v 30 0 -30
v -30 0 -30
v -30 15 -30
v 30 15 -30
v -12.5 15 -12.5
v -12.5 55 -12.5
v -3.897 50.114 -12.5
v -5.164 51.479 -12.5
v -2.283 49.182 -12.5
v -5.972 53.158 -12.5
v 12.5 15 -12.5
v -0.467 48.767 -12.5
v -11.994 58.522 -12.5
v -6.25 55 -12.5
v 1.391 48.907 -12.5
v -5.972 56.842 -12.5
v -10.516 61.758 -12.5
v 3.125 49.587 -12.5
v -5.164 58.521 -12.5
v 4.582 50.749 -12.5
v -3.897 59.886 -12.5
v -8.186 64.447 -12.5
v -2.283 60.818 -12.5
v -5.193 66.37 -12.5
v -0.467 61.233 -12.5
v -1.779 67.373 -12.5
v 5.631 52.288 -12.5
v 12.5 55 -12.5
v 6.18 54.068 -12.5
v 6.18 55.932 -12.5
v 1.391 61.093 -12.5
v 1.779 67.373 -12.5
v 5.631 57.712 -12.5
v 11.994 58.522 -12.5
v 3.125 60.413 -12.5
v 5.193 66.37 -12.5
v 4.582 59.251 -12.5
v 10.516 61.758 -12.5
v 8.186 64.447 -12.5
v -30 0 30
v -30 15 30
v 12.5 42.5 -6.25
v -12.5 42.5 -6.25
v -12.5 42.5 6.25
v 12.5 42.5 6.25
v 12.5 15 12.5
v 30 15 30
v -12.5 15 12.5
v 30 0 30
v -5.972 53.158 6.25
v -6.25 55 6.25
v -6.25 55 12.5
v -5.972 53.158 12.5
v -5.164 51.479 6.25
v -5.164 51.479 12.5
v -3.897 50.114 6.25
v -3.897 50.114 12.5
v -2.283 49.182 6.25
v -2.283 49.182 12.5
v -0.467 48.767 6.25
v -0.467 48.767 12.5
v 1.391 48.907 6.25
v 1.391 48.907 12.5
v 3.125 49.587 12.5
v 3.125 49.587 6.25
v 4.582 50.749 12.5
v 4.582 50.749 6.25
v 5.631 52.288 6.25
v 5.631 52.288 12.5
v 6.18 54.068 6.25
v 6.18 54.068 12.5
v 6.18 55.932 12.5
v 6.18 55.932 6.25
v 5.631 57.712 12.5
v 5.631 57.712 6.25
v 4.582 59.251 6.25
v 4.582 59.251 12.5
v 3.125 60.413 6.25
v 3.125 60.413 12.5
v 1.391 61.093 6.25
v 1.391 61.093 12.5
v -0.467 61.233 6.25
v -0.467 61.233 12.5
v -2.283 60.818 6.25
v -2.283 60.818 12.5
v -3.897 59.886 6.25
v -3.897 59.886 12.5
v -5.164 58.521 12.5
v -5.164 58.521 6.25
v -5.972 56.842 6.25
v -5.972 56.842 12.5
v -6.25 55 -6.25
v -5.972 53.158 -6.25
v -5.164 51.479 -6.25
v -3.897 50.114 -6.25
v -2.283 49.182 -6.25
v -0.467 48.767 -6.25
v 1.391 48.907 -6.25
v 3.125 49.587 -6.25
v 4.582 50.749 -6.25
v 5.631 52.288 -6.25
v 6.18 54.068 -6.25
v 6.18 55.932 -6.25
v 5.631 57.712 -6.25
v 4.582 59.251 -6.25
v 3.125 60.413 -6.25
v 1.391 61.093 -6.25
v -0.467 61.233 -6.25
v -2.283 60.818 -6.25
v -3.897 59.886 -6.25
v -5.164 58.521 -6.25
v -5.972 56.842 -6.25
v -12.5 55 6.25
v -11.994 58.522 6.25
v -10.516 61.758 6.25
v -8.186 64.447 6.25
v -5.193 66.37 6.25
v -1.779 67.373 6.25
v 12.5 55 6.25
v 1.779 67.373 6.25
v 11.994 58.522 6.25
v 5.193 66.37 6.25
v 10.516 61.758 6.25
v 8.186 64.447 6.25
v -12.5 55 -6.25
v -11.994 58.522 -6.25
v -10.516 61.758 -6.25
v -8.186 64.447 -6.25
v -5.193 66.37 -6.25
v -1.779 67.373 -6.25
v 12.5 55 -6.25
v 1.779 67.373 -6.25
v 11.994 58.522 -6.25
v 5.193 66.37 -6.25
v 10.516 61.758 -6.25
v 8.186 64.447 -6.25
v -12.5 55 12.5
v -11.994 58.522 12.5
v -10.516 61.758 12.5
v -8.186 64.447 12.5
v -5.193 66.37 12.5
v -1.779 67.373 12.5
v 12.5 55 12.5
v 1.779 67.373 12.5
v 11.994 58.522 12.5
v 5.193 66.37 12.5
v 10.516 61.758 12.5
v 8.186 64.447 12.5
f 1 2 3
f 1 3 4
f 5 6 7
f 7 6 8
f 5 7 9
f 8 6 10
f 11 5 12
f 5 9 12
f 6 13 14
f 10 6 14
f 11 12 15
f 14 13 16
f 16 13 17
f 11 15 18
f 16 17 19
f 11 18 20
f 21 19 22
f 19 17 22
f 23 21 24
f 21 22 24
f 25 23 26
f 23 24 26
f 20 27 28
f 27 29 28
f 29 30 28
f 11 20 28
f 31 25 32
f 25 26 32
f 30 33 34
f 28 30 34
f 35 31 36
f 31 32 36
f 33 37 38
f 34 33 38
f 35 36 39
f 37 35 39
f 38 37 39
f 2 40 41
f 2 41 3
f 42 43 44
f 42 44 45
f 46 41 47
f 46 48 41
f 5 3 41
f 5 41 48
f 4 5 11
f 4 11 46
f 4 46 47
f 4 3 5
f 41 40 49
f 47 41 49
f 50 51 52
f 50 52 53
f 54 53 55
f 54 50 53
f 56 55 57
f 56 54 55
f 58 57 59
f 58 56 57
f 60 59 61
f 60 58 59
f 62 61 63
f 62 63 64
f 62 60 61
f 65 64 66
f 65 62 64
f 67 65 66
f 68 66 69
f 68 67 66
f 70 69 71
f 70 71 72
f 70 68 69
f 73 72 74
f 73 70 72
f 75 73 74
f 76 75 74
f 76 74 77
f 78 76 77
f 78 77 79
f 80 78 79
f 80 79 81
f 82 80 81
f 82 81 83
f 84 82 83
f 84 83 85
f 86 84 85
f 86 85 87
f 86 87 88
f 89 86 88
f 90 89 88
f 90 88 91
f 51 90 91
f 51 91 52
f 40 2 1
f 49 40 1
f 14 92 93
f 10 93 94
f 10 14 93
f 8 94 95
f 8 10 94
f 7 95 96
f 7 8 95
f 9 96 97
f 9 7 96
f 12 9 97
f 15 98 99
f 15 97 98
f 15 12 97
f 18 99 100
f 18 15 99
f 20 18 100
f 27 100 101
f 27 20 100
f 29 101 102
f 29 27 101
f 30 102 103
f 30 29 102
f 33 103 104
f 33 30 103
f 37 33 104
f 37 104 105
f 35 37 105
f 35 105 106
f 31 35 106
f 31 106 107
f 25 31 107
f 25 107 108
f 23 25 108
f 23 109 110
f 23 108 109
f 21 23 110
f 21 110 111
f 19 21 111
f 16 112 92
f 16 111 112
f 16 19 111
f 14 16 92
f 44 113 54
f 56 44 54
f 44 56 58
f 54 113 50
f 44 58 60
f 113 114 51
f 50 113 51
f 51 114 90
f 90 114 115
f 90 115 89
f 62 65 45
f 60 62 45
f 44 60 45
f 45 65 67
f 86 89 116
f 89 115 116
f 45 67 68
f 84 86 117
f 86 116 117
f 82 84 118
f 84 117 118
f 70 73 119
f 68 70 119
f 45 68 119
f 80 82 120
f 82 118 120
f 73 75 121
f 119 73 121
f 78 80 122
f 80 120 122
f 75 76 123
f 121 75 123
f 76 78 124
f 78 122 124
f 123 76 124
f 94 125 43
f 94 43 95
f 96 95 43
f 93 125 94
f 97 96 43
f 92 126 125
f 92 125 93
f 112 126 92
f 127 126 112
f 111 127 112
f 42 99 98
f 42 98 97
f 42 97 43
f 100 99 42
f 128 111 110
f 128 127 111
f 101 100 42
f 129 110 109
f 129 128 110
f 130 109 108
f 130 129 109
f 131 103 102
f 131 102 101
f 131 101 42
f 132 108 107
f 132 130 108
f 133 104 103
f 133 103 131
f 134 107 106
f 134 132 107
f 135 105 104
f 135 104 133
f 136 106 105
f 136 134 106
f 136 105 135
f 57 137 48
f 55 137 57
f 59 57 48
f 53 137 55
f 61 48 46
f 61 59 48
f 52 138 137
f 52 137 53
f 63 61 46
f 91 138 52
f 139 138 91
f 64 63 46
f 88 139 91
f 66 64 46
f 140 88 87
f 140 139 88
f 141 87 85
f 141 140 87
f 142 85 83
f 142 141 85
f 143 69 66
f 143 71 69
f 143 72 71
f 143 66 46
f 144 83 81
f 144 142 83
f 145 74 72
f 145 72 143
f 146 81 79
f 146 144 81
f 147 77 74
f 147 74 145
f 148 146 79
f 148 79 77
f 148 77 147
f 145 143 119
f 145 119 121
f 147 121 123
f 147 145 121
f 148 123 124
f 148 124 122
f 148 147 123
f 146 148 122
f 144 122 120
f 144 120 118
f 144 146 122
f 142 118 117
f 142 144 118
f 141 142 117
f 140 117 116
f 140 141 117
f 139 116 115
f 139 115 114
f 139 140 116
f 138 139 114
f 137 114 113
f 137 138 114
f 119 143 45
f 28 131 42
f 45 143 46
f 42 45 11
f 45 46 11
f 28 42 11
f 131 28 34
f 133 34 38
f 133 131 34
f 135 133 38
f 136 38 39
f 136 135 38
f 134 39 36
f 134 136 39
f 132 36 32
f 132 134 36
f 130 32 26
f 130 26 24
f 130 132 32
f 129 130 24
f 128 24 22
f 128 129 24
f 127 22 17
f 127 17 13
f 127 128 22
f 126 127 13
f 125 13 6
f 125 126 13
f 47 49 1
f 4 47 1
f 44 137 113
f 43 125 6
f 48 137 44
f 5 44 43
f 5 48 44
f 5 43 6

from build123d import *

# Parameters (mm, degrees)
SKETCH_1_W               = 60
SKETCH_1_H               = 60
EXTRUDE_1_DEPTH          = 15
EXTRUDE_START            = 15
SKETCH_2_W               = 25
SKETCH_2_H               = 25
EXTRUDE_2_DEPTH          = 40
EXTRUDE_START_2          = 12.5
EXTRUDE_3_DEPTH          = 25
CUT_EXTRUDE_START        = -12.5
SKETCH_8_R               = 6.25
CUT_EXTRUDE_5_DEPTH      = 25
CUT_EXTRUDE_6_DEPTH      = 6.25
CUT_EXTRUDE_6_DEPTH_BACK = 6.25
SKETCH_9_W               = 25
SKETCH_9_H               = 25


with BuildPart() as part:
    # 草图1 → 凸台-拉伸1 (new body)
    with BuildSketch(Plane(origin=(0, 0, 0), x_dir=(1, 0, 0), z_dir=(0, 1, 0))):
        Rectangle(SKETCH_1_W, SKETCH_1_H)
    extrude(amount=EXTRUDE_1_DEPTH)

    # 草图2 → 凸台-拉伸2 (add)
    with BuildSketch(Plane(origin=(0, 0, 0), x_dir=(1, 0, 0), z_dir=(0, 1, 0)).offset(EXTRUDE_START)):
        Rectangle(SKETCH_2_W, SKETCH_2_H)
    extrude(amount=EXTRUDE_2_DEPTH)

    # 草图6 → 凸台-拉伸3 (add)
    with BuildSketch(Plane.XY.offset(EXTRUDE_START_2)):
        with BuildLine():
            Line((-12.5, 55), (12.5, 55))
            ThreePointArc((12.5, 55), (0, 67.5), (-12.5, 55))
        make_face()
    extrude(amount=-EXTRUDE_3_DEPTH)

    # 草图8 → 切除-拉伸5 (cut)
    with BuildSketch(Plane.XY.offset(CUT_EXTRUDE_START)):
        with Locations(Location((0, 55, 0), (0, 0, 180))):
            Circle(SKETCH_8_R)
    extrude(amount=CUT_EXTRUDE_5_DEPTH, mode=Mode.SUBTRACT)

    # 草图9 → 切除-拉伸6 (cut, two sides: drawn at the far end of the back side and taken through both)
    with BuildSketch(Plane.XY.offset(-CUT_EXTRUDE_6_DEPTH_BACK)):
        with Locations((0, 55)):
            Rectangle(SKETCH_9_W, SKETCH_9_H)
    extrude(amount=CUT_EXTRUDE_6_DEPTH + CUT_EXTRUDE_6_DEPTH_BACK, mode=Mode.SUBTRACT)


solid = part.part
